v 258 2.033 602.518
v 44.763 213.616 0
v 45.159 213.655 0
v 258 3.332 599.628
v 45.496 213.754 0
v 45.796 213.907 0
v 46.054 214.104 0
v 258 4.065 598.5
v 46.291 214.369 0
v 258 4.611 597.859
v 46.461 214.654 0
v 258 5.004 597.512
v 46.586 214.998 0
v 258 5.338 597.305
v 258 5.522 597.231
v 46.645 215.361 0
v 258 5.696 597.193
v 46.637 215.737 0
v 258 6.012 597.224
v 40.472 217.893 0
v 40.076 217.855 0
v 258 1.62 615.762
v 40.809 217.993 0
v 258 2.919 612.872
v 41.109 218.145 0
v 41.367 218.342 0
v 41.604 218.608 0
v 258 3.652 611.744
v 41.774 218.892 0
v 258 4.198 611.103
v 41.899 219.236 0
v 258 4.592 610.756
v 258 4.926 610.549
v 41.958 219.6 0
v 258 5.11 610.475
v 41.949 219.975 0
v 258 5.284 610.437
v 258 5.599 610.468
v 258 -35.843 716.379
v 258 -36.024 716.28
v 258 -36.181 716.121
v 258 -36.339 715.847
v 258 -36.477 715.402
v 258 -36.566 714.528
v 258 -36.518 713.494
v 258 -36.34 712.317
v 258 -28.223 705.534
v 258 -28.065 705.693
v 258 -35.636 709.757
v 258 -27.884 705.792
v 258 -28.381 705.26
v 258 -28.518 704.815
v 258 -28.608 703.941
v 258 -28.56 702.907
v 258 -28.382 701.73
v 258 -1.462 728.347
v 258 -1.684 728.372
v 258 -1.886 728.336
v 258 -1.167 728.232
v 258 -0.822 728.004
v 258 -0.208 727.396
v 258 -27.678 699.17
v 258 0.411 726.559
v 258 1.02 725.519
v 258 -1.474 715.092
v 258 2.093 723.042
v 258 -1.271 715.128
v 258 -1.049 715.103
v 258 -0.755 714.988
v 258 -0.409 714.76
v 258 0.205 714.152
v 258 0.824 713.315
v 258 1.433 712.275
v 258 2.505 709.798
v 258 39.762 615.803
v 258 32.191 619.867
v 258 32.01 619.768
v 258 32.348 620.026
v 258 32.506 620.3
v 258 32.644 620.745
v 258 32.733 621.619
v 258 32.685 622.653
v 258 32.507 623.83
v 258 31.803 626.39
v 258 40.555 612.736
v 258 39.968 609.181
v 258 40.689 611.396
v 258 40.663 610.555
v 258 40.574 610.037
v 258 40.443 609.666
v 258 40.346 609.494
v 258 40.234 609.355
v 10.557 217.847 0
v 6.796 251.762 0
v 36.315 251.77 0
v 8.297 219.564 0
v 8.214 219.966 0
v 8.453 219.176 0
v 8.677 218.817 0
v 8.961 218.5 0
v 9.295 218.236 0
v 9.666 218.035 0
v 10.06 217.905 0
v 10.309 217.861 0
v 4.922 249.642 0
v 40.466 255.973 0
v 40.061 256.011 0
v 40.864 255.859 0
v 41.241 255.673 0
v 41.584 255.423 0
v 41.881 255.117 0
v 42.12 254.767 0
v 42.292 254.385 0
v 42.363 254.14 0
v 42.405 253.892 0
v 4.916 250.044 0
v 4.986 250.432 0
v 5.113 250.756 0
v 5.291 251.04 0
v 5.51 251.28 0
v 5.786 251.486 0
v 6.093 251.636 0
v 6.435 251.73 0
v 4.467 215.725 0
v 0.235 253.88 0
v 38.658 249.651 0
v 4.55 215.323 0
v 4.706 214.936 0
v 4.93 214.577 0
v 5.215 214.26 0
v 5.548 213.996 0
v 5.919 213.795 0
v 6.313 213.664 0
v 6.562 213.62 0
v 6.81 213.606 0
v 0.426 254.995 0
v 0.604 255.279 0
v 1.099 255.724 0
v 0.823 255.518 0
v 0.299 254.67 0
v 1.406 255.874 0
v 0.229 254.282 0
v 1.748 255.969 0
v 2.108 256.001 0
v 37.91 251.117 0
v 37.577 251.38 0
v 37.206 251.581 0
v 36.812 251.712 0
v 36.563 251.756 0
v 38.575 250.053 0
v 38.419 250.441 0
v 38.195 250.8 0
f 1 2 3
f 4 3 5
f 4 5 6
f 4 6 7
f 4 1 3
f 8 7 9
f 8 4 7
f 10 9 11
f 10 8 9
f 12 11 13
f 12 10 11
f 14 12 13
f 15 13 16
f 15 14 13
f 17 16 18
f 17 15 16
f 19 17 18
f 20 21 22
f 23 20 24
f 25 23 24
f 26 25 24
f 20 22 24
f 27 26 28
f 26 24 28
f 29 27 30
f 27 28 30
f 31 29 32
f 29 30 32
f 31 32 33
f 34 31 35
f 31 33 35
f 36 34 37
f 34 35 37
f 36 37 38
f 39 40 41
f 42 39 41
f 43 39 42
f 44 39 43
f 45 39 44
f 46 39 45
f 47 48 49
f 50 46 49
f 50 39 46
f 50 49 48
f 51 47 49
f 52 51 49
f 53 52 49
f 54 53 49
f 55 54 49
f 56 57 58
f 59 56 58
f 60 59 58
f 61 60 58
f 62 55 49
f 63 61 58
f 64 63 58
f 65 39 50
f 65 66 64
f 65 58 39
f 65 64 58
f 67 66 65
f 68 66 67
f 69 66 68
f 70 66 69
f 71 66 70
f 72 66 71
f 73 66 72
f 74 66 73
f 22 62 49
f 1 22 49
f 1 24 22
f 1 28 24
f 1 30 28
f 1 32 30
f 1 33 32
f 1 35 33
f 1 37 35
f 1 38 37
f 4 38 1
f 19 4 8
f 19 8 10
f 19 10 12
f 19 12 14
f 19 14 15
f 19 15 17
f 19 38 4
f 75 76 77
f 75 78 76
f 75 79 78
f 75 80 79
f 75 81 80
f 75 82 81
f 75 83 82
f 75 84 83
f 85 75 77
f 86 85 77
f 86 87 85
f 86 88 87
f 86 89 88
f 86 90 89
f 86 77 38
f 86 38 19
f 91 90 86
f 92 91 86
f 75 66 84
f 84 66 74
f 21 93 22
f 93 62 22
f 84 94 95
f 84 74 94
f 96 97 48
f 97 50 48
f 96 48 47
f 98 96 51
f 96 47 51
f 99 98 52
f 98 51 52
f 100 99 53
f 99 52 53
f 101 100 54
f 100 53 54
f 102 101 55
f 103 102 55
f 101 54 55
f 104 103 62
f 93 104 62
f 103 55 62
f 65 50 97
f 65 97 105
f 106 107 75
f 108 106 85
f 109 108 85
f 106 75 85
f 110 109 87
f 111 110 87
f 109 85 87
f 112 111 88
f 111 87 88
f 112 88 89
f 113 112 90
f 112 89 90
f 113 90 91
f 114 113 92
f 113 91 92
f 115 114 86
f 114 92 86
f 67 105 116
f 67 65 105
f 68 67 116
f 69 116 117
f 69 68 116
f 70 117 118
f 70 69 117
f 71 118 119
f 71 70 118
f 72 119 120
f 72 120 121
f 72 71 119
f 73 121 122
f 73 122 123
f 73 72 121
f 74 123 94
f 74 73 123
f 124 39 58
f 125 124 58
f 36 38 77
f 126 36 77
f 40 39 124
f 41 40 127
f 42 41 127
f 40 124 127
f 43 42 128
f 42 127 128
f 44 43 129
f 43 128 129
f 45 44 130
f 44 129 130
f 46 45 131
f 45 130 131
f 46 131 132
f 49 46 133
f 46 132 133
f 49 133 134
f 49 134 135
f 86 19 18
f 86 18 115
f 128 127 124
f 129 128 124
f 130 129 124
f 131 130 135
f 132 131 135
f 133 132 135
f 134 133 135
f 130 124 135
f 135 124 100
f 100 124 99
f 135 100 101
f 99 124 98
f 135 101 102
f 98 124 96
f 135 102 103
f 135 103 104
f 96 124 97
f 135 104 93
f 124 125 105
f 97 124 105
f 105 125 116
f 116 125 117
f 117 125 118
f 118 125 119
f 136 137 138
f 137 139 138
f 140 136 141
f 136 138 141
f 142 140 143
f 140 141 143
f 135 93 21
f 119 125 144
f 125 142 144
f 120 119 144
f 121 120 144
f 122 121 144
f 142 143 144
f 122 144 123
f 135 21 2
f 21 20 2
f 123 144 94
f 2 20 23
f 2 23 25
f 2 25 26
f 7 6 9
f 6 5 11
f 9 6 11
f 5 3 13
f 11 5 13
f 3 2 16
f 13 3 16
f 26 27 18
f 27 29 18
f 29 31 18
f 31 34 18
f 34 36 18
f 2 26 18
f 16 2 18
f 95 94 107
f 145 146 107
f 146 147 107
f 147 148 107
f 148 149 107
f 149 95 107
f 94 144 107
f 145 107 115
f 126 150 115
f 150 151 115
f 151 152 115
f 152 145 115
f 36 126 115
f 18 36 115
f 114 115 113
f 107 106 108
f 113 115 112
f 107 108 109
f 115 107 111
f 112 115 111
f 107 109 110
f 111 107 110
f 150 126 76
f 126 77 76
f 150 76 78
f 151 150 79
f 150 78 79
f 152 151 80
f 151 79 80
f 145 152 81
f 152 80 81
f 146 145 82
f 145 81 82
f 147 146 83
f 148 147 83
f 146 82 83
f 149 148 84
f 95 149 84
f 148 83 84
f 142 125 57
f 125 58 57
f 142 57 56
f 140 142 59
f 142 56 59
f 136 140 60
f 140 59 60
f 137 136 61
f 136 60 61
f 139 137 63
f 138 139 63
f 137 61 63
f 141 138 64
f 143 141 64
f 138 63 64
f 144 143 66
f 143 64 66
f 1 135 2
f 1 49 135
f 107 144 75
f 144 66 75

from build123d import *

# Parameters (mm, degrees)
BOSS_EXTRU_1_DEPTH           = 729
ENL_V_MAT_EXTRU_1_DEPTH      = 727
ESQUISSE3_W                  = 40
ESQUISSE3_H                  = 40
BOSS_EXTRU_2_DEPTH           = 814.58026
ENL_V_MAT_EXTRU_2_DEPTH      = 829.69546376
ENL_V_MAT_EXTRU_2_DEPTH_BACK = 829.69546376
ESQUISSE4_W                  = 98.578400591
ESQUISSE4_H                  = 147.950096535
ESQUISSE4_W_2                = 77.840885054
ESQUISSE4_H_2                = 46.084081252
ESQUISSE7_W                  = 821.544509843
ESQUISSE7_H                  = 616.158382383
ESQUISSE7_W_2                = 40
ESQUISSE7_H_2                = 40
ENL_V_MAT_EXTRU_6_DEPTH      = 828.213294061
ESQUISSE8_W                  = 32
ESQUISSE8_H                  = 32
ENL_V_MAT_EXTRU_9_DEPTH      = 828.213294061
CONG_2_R                     = 2


with BuildPart() as part:
    # Esquisse1 → Boss.-Extru.1 (new body)
    with BuildSketch(Plane.XY):
        Polygon((0, 0), (258, 0), (0, 256), align=None)
    extrude(amount=BOSS_EXTRU_1_DEPTH)

    # Esquisse2 → Enlèv. mat.-Extru.1 (cut)
    with BuildSketch(Plane.ZY):
        Polygon((0, 256), (729, 0), (729, 256), align=None)
    extrude(amount=-ENL_V_MAT_EXTRU_1_DEPTH, mode=Mode.SUBTRACT)

    # Esquisse3 → Boss.-Extru.2 (add)
    with BuildSketch(Plane(origin=(0, 256, 0), x_dir=(0.948516525956314, 0.10519863837129277, -0.2987467932423567), z_dir=(0.31672753768478995, -0.31427228545467534, 0.8949394378767902))):
        with Locations((20, -20)):
            Rectangle(ESQUISSE3_W, ESQUISSE3_H)
    extrude(amount=BOSS_EXTRU_2_DEPTH)

    # Esquisse4 → Enlèv. mat.-Extru.2 (cut, two sides: drawn at the far end of the back side and taken through both)
    with BuildSketch(Plane(origin=(0, 0, 0), x_dir=(-1, 0, 0), z_dir=(0, -1, 0)).offset(-ENL_V_MAT_EXTRU_2_DEPTH_BACK)):
        with Locations((-307.289200295, -655.024951733)):
            Rectangle(ESQUISSE4_W, ESQUISSE4_H)
        with Locations((-38.920442527, 23.042040626)):
            Rectangle(ESQUISSE4_W_2, ESQUISSE4_H_2)
    extrude(amount=ENL_V_MAT_EXTRU_2_DEPTH + ENL_V_MAT_EXTRU_2_DEPTH_BACK, mode=Mode.SUBTRACT)

    # Esquisse7 → Enlèv. mat.-Extru.6 (cut, through all)
    with BuildSketch(Plane(origin=(0, 256, 0), x_dir=(0.948516525956314, 0.10519863837129277, -0.2987467932423567), z_dir=(0.31672753768478995, -0.31427228545467534, 0.8949394378767902))):
        with Locations((22.907114777, -53.97111912)):
            Rectangle(ESQUISSE7_W, ESQUISSE7_H)
        with Locations((20, -20)):
            Rectangle(ESQUISSE7_W_2, ESQUISSE7_H_2, mode=Mode.SUBTRACT)
    extrude(amount=ENL_V_MAT_EXTRU_6_DEPTH, mode=Mode.SUBTRACT)

    # Esquisse8 → Enlèv. mat.-Extru.9 (cut, through all)
    with BuildSketch(Plane(origin=(0, 256, 0), x_dir=(0.948516525956314, 0.10519863837129277, -0.2987467932423567), z_dir=(0.31672753768478995, -0.31427228545467534, 0.8949394378767902))):
        with Locations((20, -20)):
            Rectangle(ESQUISSE8_W, ESQUISSE8_H)
    extrude(amount=ENL_V_MAT_EXTRU_9_DEPTH, mode=Mode.SUBTRACT)

    # Congé2
    cong_2_edges = [part.edges().sort_by_distance(p)[0] for p in [
        (131.343588352, 126.087109834, 357.878000354),
        (133.224361668, 94.037568496, 352.563722265),
        (150.092295167, 110.783988508, 304.90200319),
        (148.211521852, 142.833529846, 310.21628128),
        (129, 128, 364.5),
        (150.084916875, 148.933025015, 304.922851157),
        (152.435883519, 108.871098342, 298.280003544),
        (131.350966645, 87.938073327, 357.857152388),
    ]]
    fillet(cong_2_edges, radius=CONG_2_R)


solid = part.part
